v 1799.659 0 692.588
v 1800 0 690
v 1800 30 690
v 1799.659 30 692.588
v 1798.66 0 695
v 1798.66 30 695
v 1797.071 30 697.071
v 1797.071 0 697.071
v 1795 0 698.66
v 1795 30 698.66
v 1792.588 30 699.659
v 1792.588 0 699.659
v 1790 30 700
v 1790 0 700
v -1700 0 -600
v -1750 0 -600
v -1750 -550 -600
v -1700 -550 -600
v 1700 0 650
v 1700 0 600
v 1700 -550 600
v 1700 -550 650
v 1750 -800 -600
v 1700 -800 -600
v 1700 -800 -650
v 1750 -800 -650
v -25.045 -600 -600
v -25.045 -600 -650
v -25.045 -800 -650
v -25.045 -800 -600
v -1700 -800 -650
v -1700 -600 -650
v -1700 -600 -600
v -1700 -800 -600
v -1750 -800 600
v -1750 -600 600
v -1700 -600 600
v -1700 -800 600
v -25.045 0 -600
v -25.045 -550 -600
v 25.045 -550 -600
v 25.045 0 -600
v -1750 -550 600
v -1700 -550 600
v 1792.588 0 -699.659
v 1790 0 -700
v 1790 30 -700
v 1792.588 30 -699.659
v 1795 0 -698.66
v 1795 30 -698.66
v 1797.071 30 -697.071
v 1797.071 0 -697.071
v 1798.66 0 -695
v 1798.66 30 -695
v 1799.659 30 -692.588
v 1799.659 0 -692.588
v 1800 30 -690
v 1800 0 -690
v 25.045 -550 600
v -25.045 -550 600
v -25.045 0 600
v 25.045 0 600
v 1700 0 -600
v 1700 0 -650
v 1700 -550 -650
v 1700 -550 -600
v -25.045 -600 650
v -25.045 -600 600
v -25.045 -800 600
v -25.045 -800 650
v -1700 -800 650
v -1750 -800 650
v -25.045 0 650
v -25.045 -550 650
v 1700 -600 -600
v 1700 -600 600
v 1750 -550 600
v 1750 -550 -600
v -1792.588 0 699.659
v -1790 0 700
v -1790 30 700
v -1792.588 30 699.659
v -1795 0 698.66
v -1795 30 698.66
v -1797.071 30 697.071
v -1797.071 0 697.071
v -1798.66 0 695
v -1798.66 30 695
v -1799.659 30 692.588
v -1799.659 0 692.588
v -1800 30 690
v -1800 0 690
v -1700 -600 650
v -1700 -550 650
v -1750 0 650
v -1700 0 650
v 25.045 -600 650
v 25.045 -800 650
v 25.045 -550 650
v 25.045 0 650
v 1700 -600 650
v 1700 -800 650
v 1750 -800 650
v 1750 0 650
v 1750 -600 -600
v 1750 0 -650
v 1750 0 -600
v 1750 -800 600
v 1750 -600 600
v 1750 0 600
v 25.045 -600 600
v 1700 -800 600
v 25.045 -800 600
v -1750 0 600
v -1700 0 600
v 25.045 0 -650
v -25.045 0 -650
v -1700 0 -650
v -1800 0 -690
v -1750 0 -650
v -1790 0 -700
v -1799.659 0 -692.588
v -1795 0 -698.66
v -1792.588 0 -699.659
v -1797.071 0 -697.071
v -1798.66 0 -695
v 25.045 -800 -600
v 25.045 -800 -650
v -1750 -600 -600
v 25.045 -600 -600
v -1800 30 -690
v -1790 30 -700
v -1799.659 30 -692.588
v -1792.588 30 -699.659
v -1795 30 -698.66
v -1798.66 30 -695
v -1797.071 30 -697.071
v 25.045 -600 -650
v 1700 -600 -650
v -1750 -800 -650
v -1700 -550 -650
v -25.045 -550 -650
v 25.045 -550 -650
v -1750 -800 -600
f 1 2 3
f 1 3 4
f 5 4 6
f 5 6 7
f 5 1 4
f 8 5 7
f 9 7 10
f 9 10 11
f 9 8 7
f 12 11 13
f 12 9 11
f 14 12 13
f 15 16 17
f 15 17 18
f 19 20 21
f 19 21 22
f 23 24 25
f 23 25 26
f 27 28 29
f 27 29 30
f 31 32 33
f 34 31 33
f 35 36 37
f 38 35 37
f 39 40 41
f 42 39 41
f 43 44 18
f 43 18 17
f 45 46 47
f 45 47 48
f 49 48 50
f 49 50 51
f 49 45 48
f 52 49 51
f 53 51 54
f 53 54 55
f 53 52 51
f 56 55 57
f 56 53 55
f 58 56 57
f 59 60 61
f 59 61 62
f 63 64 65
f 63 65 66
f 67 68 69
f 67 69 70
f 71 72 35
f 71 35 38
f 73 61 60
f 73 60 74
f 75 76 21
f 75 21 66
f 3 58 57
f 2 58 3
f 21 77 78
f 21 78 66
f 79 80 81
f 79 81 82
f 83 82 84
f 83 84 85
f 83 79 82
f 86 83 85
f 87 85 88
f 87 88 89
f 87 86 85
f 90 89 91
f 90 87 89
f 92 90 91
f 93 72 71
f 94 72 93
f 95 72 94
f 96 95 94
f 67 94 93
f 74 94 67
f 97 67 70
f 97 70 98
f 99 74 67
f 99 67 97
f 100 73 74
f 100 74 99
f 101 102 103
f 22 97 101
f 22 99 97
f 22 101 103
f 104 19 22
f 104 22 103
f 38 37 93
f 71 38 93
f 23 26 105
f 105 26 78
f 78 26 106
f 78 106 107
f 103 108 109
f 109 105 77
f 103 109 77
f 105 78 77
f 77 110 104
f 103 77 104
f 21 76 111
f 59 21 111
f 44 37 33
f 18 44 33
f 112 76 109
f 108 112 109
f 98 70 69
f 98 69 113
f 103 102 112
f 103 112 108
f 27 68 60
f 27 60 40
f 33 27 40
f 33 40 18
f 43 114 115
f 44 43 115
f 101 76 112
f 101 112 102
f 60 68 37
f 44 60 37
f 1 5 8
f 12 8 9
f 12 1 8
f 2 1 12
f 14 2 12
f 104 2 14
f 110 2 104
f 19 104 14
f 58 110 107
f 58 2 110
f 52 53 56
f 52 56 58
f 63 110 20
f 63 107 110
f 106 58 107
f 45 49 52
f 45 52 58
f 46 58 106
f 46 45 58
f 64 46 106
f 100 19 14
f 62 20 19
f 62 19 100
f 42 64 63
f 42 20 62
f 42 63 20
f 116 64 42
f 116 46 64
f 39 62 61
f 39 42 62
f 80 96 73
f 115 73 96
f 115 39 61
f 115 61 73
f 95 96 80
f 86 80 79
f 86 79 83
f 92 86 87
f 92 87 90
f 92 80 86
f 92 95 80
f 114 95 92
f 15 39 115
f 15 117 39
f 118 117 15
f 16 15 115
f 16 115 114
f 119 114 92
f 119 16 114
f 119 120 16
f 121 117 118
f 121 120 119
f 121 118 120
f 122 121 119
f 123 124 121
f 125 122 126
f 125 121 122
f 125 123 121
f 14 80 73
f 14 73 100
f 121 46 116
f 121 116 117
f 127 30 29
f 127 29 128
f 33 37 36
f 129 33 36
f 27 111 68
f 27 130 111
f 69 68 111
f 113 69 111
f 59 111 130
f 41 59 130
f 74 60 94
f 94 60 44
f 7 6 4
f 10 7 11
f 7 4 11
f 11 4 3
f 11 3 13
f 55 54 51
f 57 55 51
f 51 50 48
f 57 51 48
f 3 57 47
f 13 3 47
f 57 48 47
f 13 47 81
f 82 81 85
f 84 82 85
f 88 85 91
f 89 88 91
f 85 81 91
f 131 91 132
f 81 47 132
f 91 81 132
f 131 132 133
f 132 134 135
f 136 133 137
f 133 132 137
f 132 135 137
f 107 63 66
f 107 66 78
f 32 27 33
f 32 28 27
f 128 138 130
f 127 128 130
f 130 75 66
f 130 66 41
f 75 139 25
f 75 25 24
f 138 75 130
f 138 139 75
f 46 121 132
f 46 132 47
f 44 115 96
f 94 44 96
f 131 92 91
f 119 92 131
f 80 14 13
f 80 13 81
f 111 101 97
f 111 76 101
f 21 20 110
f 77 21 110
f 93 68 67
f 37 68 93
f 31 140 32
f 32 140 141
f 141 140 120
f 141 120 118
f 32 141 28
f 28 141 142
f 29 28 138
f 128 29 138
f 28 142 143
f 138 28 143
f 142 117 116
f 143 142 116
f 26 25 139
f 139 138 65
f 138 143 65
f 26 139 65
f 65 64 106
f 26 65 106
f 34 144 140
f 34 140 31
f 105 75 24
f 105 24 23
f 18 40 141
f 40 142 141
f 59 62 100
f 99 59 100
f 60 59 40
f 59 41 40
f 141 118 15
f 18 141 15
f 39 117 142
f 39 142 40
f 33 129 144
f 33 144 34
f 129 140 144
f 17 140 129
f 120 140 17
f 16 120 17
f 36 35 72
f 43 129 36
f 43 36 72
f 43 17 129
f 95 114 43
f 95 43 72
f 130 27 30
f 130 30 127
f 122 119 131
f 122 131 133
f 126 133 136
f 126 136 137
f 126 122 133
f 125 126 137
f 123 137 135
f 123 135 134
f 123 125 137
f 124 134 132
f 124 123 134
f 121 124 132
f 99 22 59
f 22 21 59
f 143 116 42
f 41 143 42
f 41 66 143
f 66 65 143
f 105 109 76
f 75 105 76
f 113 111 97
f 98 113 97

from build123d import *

# Parameters (mm, degrees)
Y_KSEKLIK_EKSTR_ZYON1_DEPTH = 30
IZIM2_W                     = 50
IZIM2_H                     = 50
IZIM2_W_2                   = 50.08957129
Y_KSEKLIK_EKSTR_ZYON2_DEPTH = 800
IZIM3_W                     = 1674.955214355
IZIM3_H                     = 1200
Y_KSEKLIK_EKSTR_ZYON3_DEPTH = 50


with BuildPart() as part:
    # Çizim1 → Yükseklik-Ekstrüzyon1 (new body)
    with BuildSketch(Plane(origin=(0, 0, 0), x_dir=(1, 0, 0), z_dir=(0, 1, 0))):
        with BuildLine():
            Line((1790, -700), (-1790, -700))
            ThreePointArc((-1790, -700), (-1797.071067812, -697.071067812), (-1800, -690))
            Line((-1800, -690), (-1800, 690))
            ThreePointArc((-1800, 690), (-1797.071067812, 697.071067812), (-1790, 700))
            Line((-1790, 700), (1790, 700))
            ThreePointArc((1790, 700), (1797.071067812, 697.071067812), (1800, 690))
            Line((1800, 690), (1800, -690))
            ThreePointArc((1800, -690), (1797.071067812, -697.071067812), (1790, -700))
        make_face()
    extrude(amount=Y_KSEKLIK_EKSTR_ZYON1_DEPTH)

    # Çizim2 → Yükseklik-Ekstrüzyon2 (add)
    with BuildSketch(Plane.XZ):
        with Locations((-1725, 625)):
            Rectangle(IZIM2_W, IZIM2_H)
        with Locations((-1725, -625)):
            Rectangle(IZIM2_W, IZIM2_H)
        with Locations((1725, -625)):
            Rectangle(IZIM2_W, IZIM2_H)
        with Locations((1725, 625)):
            Rectangle(IZIM2_W, IZIM2_H)
        with Locations((0, -625)):
            Rectangle(IZIM2_W_2, IZIM2_H)
        with Locations((0, 625)):
            Rectangle(IZIM2_W_2, IZIM2_H)
    extrude(amount=Y_KSEKLIK_EKSTR_ZYON2_DEPTH)

    # Çizim3 → Yükseklik-Ekstrüzyon3 (add)
    with BuildSketch(Plane(origin=(0, -600, 0), x_dir=(-1, 0, 0), z_dir=(0, -1, 0))):
        Polygon((-25.044785645, -650), (25.044785645, -650), (1700, -650), (1750, -650), (1750, 650), (1700, 650), (25.044785645, 650), (-25.044785645, 650), (-1700, 650), (-1750, 650), (-1750, -650), (-1700, -650), align=None)
        with Locations((-862.522392823, 0)):
            Rectangle(IZIM3_W, IZIM3_H, mode=Mode.SUBTRACT)
        with Locations((862.522392823, 0)):
            Rectangle(IZIM3_W, IZIM3_H, mode=Mode.SUBTRACT)
    extrude(amount=-Y_KSEKLIK_EKSTR_ZYON3_DEPTH)


solid = part.part
